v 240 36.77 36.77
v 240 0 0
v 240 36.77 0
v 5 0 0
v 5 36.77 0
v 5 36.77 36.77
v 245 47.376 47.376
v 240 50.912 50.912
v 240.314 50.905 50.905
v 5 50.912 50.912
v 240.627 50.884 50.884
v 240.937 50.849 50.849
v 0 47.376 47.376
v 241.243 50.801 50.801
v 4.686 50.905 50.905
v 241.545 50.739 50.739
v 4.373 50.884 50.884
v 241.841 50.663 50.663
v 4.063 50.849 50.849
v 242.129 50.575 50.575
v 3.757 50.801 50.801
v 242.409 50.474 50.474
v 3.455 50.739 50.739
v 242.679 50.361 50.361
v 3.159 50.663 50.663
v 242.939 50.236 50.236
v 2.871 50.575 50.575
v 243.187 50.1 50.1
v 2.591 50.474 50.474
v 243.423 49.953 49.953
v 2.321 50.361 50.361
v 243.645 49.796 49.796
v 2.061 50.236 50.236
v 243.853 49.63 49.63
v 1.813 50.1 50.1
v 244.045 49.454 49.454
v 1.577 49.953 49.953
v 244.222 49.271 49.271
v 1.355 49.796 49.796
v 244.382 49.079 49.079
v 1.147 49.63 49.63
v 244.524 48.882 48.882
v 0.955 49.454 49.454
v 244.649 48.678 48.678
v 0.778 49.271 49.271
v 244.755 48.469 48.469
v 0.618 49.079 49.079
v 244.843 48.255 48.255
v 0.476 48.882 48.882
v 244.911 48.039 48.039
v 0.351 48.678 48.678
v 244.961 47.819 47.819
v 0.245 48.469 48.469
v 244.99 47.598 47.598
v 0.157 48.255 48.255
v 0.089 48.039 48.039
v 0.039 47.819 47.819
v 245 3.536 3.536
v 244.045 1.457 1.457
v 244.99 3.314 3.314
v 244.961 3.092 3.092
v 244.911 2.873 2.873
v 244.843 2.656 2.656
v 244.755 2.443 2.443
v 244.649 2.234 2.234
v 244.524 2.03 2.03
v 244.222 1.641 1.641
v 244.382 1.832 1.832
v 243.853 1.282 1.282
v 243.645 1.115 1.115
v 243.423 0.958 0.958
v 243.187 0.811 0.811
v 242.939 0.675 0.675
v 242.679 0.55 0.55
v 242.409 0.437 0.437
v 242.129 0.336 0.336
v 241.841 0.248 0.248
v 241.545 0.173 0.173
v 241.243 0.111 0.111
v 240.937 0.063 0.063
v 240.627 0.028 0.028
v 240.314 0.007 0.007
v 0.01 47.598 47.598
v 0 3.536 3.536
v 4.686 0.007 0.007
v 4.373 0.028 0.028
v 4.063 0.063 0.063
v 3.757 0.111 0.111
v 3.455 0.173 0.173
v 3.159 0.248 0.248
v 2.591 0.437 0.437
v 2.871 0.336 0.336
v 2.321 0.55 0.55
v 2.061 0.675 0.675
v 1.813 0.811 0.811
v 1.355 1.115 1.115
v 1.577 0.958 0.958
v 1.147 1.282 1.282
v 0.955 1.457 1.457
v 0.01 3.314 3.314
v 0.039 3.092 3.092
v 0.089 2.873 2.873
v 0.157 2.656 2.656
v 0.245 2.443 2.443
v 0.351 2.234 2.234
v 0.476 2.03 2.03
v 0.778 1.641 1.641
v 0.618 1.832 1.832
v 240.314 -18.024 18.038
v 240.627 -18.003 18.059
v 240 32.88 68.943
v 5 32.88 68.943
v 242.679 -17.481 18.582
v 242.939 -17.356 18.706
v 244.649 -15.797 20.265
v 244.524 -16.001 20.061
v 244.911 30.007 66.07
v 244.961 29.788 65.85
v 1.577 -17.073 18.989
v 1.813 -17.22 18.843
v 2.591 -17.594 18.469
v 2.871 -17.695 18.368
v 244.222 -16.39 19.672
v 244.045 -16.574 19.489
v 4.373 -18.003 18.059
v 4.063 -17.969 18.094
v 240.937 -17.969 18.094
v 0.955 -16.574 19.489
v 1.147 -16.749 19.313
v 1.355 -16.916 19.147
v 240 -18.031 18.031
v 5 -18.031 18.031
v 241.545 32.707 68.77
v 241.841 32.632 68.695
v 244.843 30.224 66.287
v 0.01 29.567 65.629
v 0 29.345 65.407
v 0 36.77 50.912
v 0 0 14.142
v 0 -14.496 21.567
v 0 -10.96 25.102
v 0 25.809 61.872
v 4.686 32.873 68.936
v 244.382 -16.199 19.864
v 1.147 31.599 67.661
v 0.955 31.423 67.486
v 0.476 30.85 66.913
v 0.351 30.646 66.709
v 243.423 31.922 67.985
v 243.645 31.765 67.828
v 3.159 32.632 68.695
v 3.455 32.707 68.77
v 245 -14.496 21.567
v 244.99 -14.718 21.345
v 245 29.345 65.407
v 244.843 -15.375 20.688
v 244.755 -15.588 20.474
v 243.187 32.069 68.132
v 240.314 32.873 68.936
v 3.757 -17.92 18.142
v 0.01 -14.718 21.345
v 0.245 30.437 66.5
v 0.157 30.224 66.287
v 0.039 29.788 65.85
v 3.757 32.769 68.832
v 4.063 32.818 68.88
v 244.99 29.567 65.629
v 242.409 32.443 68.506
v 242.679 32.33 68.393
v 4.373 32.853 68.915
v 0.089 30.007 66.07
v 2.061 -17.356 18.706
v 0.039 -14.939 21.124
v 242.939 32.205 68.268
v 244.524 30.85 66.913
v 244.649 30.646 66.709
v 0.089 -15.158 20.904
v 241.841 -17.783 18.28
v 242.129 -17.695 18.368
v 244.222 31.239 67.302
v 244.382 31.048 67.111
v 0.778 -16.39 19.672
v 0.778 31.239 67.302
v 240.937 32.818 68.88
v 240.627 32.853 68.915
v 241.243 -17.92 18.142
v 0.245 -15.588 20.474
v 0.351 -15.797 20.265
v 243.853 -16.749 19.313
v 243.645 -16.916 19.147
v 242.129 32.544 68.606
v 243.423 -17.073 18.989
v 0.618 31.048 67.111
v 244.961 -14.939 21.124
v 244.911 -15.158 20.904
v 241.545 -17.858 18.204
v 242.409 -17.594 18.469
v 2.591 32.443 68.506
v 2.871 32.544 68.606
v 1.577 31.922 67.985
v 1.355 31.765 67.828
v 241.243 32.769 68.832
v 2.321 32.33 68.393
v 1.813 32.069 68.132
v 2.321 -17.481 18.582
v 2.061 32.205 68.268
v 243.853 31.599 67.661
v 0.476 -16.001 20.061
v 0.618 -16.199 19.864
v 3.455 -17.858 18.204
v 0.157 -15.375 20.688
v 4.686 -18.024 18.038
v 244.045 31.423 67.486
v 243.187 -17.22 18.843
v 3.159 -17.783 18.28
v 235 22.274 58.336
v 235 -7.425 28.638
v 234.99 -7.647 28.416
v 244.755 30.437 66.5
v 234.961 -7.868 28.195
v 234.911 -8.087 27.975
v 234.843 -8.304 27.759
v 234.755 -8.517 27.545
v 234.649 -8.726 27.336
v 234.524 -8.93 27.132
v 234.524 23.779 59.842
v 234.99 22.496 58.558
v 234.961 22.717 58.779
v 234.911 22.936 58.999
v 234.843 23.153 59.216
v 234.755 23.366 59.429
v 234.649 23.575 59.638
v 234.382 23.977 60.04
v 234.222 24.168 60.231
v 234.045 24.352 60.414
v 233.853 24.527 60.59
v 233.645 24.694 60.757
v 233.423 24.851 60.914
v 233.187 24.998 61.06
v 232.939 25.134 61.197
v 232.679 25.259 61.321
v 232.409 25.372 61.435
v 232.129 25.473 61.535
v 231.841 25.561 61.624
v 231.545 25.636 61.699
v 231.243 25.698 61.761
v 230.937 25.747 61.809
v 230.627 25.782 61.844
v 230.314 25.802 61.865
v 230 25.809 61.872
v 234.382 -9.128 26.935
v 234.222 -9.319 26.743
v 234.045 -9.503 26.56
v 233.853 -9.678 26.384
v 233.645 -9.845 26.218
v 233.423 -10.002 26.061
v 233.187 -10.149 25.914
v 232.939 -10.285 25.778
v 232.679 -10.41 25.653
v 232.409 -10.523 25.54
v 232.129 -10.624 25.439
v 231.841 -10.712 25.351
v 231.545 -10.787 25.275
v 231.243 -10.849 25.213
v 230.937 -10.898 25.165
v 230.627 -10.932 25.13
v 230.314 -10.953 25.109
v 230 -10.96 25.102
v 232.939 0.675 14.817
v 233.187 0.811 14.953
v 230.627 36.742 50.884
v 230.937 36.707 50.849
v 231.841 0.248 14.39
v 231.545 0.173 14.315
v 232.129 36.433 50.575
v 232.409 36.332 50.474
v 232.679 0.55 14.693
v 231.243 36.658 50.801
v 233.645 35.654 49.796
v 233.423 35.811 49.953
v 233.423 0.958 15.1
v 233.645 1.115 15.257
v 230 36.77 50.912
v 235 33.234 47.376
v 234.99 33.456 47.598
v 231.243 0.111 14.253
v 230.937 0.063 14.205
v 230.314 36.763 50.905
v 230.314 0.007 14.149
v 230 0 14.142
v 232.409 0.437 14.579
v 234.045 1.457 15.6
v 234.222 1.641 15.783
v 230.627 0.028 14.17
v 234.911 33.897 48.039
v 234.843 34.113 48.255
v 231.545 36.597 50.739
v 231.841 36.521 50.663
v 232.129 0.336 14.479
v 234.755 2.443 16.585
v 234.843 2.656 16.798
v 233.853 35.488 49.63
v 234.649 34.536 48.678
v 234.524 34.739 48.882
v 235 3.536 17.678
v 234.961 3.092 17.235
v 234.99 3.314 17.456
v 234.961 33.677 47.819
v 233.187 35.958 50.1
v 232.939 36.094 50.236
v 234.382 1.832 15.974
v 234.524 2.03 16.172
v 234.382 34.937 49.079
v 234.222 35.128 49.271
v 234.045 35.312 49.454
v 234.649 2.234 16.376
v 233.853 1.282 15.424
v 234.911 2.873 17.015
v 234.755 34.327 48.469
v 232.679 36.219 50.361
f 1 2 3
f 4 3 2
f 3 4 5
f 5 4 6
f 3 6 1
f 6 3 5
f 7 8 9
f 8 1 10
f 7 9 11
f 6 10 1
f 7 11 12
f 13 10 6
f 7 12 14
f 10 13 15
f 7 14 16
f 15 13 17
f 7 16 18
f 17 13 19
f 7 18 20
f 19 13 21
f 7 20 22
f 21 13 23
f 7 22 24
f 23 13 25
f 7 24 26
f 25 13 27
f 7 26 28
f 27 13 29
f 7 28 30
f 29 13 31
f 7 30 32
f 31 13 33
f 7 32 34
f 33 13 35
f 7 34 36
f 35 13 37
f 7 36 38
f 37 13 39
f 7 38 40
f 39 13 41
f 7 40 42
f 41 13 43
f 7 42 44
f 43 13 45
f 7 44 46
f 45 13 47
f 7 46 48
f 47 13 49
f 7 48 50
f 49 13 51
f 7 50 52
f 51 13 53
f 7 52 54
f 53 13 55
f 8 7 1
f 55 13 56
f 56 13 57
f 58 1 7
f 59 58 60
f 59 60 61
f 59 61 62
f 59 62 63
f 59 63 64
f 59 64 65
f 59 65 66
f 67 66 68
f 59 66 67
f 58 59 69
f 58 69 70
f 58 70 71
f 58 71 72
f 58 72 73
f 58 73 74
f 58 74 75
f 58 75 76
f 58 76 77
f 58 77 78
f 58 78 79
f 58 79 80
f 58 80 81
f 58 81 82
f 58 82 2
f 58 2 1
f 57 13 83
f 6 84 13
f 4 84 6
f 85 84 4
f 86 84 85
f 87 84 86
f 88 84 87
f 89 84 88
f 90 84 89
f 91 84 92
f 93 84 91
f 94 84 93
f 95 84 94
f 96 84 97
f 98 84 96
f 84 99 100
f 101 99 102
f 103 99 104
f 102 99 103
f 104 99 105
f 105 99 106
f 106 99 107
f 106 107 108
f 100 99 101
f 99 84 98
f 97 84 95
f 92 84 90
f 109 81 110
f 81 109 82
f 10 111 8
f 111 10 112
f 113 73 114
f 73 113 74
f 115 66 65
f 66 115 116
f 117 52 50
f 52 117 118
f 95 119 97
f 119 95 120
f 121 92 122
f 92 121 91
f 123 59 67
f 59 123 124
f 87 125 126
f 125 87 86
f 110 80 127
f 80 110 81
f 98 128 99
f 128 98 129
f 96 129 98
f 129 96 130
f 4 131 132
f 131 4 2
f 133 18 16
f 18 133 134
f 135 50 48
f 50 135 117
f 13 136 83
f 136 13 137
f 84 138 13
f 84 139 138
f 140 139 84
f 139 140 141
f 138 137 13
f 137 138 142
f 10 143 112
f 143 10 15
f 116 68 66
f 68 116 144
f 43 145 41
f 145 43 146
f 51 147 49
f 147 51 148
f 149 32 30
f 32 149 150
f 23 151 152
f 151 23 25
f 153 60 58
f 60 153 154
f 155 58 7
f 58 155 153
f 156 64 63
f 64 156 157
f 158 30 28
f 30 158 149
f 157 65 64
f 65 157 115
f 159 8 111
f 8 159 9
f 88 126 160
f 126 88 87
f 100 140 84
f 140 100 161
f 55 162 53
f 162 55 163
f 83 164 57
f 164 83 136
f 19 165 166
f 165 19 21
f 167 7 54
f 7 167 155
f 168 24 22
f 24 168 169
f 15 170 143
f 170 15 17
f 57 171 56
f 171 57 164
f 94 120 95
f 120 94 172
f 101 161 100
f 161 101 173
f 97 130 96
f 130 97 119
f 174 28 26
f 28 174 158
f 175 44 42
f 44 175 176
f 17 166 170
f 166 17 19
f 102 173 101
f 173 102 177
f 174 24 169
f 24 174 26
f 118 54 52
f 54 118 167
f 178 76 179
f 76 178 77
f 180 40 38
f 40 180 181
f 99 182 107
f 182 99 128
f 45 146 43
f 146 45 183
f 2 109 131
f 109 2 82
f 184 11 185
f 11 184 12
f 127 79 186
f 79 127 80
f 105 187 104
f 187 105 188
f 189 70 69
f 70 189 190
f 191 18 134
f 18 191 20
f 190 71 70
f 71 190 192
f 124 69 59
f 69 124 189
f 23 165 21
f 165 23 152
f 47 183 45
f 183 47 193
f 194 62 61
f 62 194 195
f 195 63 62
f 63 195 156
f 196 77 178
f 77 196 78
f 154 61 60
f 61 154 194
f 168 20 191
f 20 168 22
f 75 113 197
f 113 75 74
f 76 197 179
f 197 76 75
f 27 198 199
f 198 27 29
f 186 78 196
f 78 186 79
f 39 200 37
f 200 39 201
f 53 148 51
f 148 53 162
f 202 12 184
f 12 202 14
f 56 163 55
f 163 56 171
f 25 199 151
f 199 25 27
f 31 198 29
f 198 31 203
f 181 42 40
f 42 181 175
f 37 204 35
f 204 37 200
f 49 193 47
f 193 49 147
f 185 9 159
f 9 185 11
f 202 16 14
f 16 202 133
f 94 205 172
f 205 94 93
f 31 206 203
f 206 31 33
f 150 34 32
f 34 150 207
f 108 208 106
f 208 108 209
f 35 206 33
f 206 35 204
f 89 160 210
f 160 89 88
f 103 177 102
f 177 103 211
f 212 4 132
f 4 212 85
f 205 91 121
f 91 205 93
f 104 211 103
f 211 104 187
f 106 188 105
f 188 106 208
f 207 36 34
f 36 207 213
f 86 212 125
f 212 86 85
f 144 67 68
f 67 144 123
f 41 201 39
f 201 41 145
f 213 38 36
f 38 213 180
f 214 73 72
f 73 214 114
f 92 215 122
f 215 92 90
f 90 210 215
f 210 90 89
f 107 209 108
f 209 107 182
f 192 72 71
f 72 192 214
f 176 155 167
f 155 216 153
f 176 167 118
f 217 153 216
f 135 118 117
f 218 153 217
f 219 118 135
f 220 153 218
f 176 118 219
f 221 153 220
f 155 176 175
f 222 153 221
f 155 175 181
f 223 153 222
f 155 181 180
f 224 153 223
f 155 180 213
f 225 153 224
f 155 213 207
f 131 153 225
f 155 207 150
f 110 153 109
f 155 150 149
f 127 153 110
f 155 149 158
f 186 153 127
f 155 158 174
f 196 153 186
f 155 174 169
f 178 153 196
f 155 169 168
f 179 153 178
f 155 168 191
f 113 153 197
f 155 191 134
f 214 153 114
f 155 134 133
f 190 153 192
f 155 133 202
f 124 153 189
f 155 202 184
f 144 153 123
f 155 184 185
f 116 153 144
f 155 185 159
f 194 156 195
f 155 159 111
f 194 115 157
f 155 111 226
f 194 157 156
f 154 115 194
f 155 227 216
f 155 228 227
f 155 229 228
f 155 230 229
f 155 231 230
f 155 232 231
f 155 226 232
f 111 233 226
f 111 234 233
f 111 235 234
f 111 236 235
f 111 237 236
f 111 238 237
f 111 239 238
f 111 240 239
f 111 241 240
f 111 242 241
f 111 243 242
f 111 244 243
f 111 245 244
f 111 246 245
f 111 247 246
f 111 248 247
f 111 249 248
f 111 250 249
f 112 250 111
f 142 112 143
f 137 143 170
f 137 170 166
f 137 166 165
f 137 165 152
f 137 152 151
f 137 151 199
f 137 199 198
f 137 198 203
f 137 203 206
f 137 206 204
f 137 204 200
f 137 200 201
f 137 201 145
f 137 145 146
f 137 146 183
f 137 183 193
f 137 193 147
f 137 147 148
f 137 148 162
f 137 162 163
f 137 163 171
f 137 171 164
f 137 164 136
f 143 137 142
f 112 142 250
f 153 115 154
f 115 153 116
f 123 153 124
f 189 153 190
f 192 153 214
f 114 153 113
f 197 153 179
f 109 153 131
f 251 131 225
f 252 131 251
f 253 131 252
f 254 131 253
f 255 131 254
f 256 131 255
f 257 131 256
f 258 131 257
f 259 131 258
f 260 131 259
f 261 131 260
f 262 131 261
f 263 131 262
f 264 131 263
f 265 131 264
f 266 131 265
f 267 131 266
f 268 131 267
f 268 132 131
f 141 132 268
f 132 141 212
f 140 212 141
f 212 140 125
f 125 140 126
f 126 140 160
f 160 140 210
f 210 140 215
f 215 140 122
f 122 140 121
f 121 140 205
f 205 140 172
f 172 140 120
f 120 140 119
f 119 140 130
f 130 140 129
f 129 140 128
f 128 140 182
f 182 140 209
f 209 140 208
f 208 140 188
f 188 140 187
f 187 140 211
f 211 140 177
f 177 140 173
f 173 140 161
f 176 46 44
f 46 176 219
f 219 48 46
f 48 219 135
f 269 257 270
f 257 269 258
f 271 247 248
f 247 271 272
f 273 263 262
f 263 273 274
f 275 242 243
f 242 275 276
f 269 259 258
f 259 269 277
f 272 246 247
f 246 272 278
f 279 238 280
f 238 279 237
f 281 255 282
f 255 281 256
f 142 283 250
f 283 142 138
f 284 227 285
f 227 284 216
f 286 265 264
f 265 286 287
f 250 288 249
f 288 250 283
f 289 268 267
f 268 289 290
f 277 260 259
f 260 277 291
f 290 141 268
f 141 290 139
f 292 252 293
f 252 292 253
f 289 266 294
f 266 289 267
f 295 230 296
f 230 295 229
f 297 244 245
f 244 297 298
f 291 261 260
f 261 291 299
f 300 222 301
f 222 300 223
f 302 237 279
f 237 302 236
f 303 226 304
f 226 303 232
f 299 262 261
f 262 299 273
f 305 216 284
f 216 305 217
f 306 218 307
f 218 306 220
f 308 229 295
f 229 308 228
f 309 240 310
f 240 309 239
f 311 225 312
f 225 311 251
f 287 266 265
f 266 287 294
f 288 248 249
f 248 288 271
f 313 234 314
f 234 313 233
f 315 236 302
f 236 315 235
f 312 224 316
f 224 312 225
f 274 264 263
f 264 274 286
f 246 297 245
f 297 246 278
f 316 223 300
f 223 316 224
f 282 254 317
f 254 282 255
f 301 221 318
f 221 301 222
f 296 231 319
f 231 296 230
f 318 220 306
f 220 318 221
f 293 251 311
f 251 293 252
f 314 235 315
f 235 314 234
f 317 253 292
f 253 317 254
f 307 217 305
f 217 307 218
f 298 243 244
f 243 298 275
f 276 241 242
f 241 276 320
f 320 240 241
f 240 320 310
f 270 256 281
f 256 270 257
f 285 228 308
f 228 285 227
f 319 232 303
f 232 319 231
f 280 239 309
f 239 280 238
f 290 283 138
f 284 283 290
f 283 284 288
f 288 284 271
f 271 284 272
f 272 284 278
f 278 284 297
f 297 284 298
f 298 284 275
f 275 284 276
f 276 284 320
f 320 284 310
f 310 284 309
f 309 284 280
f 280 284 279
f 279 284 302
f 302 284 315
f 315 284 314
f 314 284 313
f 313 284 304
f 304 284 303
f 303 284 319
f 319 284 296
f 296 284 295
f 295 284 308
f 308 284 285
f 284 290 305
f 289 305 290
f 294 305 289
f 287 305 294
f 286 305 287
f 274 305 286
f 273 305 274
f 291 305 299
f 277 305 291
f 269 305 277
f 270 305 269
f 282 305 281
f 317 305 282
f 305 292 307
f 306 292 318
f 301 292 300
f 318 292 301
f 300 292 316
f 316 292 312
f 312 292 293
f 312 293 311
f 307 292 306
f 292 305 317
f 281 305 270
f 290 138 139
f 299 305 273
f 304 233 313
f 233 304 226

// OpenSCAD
$fn = 100;

module roundedcube(xdim, ydim, zdim, rdim) {
  hull(){
    translate([rdim,rdim,0]) cylinder(h=zdim,r=rdim);
    translate([xdim-rdim,rdim,0]) cylinder(h=zdim,r=rdim);
    translate([rdim,ydim-rdim,0]) cylinder(h=zdim,r=rdim);
    translate([xdim-rdim,ydim-rdim,0]) cylinder(h=zdim,r=rdim);
  }
}

ps_x = 235;
ps_y = 52;
ps_z = 31;
rim = 10;
corner_r = 5;

module powerstrip_slot() {
    difference() {
        roundedcube(ps_x + rim, ps_y + 2 * rim, ps_z / 2 + rim, corner_r);
        translate([-corner_r, rim, rim]) roundedcube(ps_x + corner_r, ps_y, ps_z, corner_r);
    }
}

module slanted_base(slant_size, width) {
    x = slant_size / sqrt(2);
    difference() {
        cube([width, x, x]);
        rotate([45, 0, 0]) cube([width, 2*x, 2*x]);
    }

    
}

module main() {
    translate([rim / 2, 0, 0]) slanted_base(slant_size=ps_y, width=ps_x);
    rotate([45, 0, 0]) powerstrip_slot();
}

main();
